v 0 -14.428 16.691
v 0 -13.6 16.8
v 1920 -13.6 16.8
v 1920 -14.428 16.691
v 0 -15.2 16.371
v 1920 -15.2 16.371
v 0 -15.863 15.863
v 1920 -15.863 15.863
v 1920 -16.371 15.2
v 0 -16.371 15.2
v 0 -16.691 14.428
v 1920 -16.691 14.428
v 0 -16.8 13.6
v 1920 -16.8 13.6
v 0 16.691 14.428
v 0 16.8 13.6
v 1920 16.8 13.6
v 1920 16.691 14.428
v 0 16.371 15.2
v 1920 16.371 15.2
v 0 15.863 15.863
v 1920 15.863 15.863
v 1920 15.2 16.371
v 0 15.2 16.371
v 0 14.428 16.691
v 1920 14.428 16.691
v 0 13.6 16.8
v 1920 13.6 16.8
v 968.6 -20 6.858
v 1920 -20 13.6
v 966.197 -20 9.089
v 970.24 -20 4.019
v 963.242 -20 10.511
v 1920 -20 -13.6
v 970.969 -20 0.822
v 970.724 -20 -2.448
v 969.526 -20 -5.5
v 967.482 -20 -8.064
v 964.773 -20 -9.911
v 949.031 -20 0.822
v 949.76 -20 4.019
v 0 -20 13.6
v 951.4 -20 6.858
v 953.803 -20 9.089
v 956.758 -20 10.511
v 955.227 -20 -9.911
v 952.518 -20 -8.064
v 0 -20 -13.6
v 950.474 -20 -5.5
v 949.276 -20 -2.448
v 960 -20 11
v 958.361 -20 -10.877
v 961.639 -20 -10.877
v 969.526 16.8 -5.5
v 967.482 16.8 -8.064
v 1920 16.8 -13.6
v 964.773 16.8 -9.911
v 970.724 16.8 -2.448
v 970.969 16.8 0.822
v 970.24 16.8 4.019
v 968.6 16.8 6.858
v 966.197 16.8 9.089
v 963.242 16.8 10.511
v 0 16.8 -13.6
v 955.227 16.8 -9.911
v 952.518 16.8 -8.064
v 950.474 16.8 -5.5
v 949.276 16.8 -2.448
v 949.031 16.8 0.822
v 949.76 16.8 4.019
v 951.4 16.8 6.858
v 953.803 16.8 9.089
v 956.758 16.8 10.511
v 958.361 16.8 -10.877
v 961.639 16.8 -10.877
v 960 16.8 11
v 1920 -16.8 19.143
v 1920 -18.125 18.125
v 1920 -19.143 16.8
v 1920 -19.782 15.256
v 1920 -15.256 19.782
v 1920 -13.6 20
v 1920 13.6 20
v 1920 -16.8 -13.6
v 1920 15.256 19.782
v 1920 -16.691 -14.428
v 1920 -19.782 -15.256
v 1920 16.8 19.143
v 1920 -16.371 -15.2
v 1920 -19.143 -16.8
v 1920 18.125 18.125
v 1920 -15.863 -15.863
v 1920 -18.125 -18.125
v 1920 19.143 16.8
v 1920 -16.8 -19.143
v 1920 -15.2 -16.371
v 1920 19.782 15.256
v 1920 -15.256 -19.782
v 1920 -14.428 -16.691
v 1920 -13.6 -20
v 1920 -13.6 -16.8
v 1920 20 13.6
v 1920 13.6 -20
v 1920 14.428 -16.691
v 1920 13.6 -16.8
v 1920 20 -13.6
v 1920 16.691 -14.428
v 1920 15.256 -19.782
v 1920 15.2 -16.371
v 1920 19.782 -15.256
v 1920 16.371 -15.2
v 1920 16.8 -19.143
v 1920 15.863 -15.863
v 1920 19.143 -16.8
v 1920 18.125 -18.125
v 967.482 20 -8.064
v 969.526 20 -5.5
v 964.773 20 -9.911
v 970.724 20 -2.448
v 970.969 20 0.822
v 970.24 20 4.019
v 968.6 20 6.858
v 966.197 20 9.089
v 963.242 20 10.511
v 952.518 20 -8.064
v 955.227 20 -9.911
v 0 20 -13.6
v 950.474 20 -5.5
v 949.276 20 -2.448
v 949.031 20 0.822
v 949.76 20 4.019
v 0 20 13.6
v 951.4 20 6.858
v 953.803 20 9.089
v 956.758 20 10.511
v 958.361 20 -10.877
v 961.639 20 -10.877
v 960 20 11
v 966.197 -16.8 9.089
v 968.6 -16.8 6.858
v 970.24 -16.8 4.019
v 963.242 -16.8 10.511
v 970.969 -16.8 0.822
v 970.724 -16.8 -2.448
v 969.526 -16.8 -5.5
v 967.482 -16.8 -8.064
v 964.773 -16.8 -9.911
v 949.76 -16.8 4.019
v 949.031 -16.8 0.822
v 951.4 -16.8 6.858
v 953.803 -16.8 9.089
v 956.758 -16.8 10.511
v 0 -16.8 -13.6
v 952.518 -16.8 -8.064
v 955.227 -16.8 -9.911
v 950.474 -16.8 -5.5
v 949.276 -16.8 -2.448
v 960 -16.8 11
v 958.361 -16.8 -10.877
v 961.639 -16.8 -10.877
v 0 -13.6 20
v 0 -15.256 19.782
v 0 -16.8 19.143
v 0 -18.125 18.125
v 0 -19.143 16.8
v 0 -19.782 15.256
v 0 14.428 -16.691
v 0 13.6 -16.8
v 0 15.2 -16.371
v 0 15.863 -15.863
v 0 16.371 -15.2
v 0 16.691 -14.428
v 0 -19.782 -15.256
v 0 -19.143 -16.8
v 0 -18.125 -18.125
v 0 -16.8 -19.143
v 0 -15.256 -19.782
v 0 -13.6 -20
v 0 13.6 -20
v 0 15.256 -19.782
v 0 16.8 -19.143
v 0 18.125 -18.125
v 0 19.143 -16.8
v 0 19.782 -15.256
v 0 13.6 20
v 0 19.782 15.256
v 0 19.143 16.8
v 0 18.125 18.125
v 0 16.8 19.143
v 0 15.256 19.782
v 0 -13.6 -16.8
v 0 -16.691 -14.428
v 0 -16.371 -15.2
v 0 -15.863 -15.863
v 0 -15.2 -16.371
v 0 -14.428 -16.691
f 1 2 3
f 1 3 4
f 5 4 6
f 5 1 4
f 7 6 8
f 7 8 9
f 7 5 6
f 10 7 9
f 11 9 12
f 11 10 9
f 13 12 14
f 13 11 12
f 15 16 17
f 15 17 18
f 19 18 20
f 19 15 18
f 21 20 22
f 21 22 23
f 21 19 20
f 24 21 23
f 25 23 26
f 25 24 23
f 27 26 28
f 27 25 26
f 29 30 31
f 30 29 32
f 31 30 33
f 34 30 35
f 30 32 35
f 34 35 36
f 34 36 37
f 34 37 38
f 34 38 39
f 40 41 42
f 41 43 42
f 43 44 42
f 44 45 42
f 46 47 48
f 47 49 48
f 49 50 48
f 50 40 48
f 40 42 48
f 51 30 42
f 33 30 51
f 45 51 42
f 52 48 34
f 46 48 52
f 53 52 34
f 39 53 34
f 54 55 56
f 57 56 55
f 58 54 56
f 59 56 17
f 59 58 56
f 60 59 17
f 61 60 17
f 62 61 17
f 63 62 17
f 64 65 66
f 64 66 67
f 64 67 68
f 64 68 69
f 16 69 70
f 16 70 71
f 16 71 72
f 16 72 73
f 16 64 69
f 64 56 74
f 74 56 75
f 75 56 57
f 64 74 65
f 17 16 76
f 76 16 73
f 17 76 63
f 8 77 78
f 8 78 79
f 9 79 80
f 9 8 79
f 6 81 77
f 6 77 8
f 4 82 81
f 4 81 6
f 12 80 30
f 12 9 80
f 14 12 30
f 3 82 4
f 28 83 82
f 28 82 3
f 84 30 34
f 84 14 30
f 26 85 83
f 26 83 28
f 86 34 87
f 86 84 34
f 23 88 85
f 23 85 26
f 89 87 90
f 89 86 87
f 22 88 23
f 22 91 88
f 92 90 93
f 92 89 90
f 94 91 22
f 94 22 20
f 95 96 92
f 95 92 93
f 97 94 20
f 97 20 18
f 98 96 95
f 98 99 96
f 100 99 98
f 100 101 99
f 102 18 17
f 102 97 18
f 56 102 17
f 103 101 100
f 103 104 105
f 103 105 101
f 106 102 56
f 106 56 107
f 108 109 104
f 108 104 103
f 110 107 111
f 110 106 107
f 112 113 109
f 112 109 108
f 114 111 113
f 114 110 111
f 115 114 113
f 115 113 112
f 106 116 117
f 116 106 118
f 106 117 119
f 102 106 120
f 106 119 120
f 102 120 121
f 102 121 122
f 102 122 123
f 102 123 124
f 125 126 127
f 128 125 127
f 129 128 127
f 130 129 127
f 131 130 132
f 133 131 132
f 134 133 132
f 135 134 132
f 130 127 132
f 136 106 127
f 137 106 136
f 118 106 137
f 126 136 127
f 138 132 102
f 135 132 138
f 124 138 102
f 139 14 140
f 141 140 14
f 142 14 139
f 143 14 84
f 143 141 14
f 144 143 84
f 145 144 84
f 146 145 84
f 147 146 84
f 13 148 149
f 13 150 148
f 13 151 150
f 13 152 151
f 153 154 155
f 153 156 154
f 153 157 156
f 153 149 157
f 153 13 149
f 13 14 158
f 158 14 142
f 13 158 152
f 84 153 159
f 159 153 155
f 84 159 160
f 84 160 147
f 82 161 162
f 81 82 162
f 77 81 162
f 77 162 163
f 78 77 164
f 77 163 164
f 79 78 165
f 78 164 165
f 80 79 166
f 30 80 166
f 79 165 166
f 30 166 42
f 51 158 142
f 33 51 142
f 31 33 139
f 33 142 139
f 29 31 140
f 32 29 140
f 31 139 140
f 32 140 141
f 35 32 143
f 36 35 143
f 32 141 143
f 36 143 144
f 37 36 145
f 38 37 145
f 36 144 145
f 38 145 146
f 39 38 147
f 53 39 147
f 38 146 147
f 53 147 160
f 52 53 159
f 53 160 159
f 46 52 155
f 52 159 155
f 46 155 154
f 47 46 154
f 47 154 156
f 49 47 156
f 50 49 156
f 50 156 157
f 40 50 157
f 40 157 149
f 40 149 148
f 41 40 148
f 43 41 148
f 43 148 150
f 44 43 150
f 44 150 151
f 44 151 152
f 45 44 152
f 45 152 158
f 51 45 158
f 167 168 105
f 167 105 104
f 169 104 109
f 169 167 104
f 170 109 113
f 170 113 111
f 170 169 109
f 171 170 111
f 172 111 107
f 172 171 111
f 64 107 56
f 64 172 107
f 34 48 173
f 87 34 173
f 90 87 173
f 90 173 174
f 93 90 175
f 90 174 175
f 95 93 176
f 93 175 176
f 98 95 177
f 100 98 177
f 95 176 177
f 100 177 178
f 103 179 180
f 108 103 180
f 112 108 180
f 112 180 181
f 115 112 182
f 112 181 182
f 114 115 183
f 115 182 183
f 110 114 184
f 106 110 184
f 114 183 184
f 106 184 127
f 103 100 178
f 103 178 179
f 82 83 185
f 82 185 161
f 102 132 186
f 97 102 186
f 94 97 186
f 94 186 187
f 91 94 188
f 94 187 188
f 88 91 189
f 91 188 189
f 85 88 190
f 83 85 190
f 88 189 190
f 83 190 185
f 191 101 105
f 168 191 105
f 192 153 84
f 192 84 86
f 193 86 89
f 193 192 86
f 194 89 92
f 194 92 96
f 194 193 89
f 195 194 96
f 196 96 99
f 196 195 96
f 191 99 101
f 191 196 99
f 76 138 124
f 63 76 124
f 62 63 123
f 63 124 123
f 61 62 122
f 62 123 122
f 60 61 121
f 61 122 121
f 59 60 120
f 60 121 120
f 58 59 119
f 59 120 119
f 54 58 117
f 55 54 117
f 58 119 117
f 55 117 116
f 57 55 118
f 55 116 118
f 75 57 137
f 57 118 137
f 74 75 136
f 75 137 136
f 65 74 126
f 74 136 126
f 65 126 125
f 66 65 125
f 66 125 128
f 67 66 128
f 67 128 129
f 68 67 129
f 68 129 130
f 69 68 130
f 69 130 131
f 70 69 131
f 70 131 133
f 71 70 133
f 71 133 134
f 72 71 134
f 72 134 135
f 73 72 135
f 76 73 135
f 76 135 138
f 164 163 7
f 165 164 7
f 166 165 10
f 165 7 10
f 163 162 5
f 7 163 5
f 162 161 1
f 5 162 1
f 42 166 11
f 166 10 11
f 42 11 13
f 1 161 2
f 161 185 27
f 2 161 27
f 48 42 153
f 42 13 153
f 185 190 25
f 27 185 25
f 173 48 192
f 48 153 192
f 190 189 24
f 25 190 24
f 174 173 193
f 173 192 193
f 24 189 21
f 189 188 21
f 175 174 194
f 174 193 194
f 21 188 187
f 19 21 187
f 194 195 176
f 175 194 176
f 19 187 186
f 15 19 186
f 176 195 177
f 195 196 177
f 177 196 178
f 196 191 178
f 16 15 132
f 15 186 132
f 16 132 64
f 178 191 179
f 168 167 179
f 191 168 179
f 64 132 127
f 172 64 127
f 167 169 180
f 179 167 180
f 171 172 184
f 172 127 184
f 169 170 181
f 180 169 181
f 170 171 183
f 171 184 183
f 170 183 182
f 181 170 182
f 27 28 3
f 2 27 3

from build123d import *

# Parameters (mm, degrees)
TUBE_SQUARE_40_X_40_X_3_2_4_DEPTH = 1920
SKETCH13_R                        = 11
CUT_EXTRUDE1_DEPTH                = 1921.52076271


with BuildPart() as part:
    # Sketch12 → Tube (square) 40 X 40 X 3.2(4) (new body)
    with BuildSketch(Plane(origin=(0, 0, 0), x_dir=(0, 0, -1), z_dir=(1, 0, 0))):
        with BuildLine():
            Line((-13.6, -20), (13.6, -20))
            ThreePointArc((13.6, -20), (18.1254834, -18.1254834), (20, -13.6))
            Line((20, -13.6), (20, 13.6))
            ThreePointArc((20, 13.6), (18.1254834, 18.1254834), (13.6, 20))
            Line((13.6, 20), (-13.6, 20))
            ThreePointArc((-13.6, 20), (-18.1254834, 18.1254834), (-20, 13.6))
            Line((-20, 13.6), (-20, -13.6))
            ThreePointArc((-20, -13.6), (-18.1254834, -18.1254834), (-13.6, -20))
        make_face()
        with BuildLine():
            Line((-13.6, -16.8), (13.6, -16.8))
            ThreePointArc((13.6, -16.8), (15.8627417, -15.8627417), (16.8, -13.6))
            Line((16.8, -13.6), (16.8, 13.6))
            ThreePointArc((16.8, 13.6), (15.8627417, 15.8627417), (13.6, 16.8))
            Line((13.6, 16.8), (-13.6, 16.8))
            ThreePointArc((-13.6, 16.8), (-15.8627417, 15.8627417), (-16.8, 13.6))
            Line((-16.8, 13.6), (-16.8, -13.6))
            ThreePointArc((-16.8, -13.6), (-15.8627417, -15.8627417), (-13.6, -16.8))
        make_face(mode=Mode.SUBTRACT)
    extrude(amount=TUBE_SQUARE_40_X_40_X_3_2_4_DEPTH)

    # Sketch13 → Cut-Extrude1 (cut, through all)
    with BuildSketch(Plane(origin=(0, 20, 0), x_dir=(1, 0, 0), z_dir=(0, 1, 0))):
        with Locations(Location((960, 0, 0), (0, 0, 270))):
            Circle(SKETCH13_R)
    extrude(amount=-CUT_EXTRUDE1_DEPTH, mode=Mode.SUBTRACT)


solid = part.part
